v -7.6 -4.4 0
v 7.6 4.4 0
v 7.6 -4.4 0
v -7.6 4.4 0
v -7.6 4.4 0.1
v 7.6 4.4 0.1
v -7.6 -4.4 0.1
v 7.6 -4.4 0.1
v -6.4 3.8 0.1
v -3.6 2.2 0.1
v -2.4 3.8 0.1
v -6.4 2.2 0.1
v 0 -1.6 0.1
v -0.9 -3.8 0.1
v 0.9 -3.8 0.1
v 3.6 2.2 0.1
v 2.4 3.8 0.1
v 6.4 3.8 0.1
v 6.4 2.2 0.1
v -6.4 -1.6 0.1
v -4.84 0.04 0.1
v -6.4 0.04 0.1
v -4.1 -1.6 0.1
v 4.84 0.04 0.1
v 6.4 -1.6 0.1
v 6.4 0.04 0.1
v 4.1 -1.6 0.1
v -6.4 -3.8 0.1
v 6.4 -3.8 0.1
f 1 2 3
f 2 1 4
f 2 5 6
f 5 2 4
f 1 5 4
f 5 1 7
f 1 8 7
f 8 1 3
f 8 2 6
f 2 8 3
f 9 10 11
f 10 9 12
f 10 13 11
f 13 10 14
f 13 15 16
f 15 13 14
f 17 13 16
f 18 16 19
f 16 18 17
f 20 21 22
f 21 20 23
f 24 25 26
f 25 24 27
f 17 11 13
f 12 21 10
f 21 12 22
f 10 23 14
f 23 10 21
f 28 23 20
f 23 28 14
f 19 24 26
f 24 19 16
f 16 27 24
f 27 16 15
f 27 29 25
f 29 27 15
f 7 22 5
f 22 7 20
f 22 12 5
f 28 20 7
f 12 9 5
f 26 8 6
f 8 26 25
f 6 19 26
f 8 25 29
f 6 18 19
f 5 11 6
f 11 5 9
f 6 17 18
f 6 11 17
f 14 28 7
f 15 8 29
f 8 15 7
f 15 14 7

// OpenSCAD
// file: ../p/box5-12.scad
use <../lib.scad>
function ldraw_lib__box5_12() = [
// 0 Box with 5 Faces without Any Edges
// 0 Name: box5-12.dat
// 0 Author: Chris Dee [cwdee]
// 0 !LDRAW_ORG Primitive UPDATE 2009-02
// 0 !LICENSE Licensed under CC BY 4.0 : see CAreadme.txt
// 
// 0 BFC CERTIFY CCW
  [0,"BFC","CERTIFY"],
  [0,"BFC","CCW"],
// 
// 0 !HISTORY 2009-09-03 [PTadmin] Official Update 2009-02
// 
// 
// 4 16 1 1 1 1 1 -1 -1 1 -1 -1 1 1
  [4,16,1,1,1,1,1,-1,-1,1,-1,-1,1,1],
// 4 16 -1 0 1 1 0 1 1 1 1 -1 1 1
  [4,16,-1,0,1,1,0,1,1,1,1,-1,1,1],
// 4 16 -1 0 -1 -1 0 1 -1 1 1 -1 1 -1
  [4,16,-1,0,-1,-1,0,1,-1,1,1,-1,1,-1],
// 4 16 1 0 -1 -1 0 -1 -1 1 -1 1 1 -1
  [4,16,1,0,-1,-1,0,-1,-1,1,-1,1,1,-1],
// 4 16 1 0 1 1 0 -1 1 1 -1 1 1 1
  [4,16,1,0,1,1,0,-1,1,1,-1,1,1,1],
// 0
];
module ldraw_lib__box5_12(step=0, col=false, unit=2/5, alt=false, line=0.2, solid=!$preview)
    makepoly(ldraw_lib__box5_12(), step=step, col=col, unit=unit, alt=alt, line=line, solid=solid);
ldraw_lib__box5_12(line=0.2);
// main file
use <../lib.scad>
use <../p/box5-12.scad>
function ldraw_lib__165485a() = [
// 0 Sticker  1.1 x  1.9 with Blue V and Red Lines
// 0 Name: 165485a.dat
// 0 Author: David Manley [djm]
// 0 !LDRAW_ORG Part UPDATE 2019-01
// 0 !LICENSE Licensed under CC BY 4.0 : see CAreadme.txt
// 
// 0 BFC CERTIFY CCW
  [0,"BFC","CERTIFY"],
  [0,"BFC","CCW"],
// 
// 0 !KEYWORDS Airport, set 6346, shuttle
// 
// 0 !HISTORY 2019-06-28 [PTadmin] Official Update 2019-01
// 
// 
// 0 // Sticker backside.
// 1 16 0 -0.25 0 19 0 0 0 0.25 0 0 0 11 box5-12.dat
  [1,16,0,-0.25,0,19,0,0,0,0.25,0,0,0,11, ldraw_lib__box5_12()],
// 0 // Blue.
// 4 1 -16 -0.25 5.5 -9 -0.25 5.5 -6 -0.25 9.5 -16 -0.25 9.5
  [4,1,-16,-0.25,5.5,-9,-0.25,5.5,-6,-0.25,9.5,-16,-0.25,9.5],
// 4 1 -2.25 -0.25 -9.5 0 -0.25 -4 -6 -0.25 9.5 -9 -0.25 5.5
  [4,1,-2.25,-0.25,-9.5,0,-0.25,-4,-6,-0.25,9.5,-9,-0.25,5.5],
// 4 1 0 -0.25 -4 -2.25 -0.25 -9.5 2.25 -0.25 -9.5 9 -0.25 5.5
  [4,1,0,-0.25,-4,-2.25,-0.25,-9.5,2.25,-0.25,-9.5,9,-0.25,5.5],
// 3 1 6 -0.25 9.5 0 -0.25 -4 9 -0.25 5.5
  [3,1,6,-0.25,9.5,0,-0.25,-4,9,-0.25,5.5],
// 4 1 16 -0.25 9.5 6 -0.25 9.5 9 -0.25 5.5 16 -0.25 5.5
  [4,1,16,-0.25,9.5,6,-0.25,9.5,9,-0.25,5.5,16,-0.25,5.5],
// 0 // Red.
// 4 4 -16 -0.25 -4 -10.25 -0.25 -4 -12.1 -0.25 0.1 -16 -0.25 0.1
  [4,4,-16,-0.25,-4,-10.25,-0.25,-4,-12.1,-0.25,0.1,-16,-0.25,0.1],
// 4 4 16 -0.25 0.1 12.1 -0.25 0.1 10.25 -0.25 -4 16 -0.25 -4
  [4,4,16,-0.25,0.1,12.1,-0.25,0.1,10.25,-0.25,-4,16,-0.25,-4],
// 0 // Transparent Surface.
// 0 // V groove.
// 3 16 6 -0.25 9.5 -6 -0.25 9.5 0 -0.25 -4
  [3,16,6,-0.25,9.5,-6,-0.25,9.5,0,-0.25,-4],
// 0 // Left red stripe surround.
// 4 16 -16 -0.25 0.1 -12.1 -0.25 0.1 -9 -0.25 5.5 -16 -0.25 5.5
  [4,16,-16,-0.25,0.1,-12.1,-0.25,0.1,-9,-0.25,5.5,-16,-0.25,5.5],
// 4 16 -9 -0.25 5.5 -12.1 -0.25 0.1 -10.25 -0.25 -4 -2.25 -0.25 -9.5
  [4,16,-9,-0.25,5.5,-12.1,-0.25,0.1,-10.25,-0.25,-4,-2.25,-0.25,-9.5],
// 4 16 -16 -0.25 -9.5 -2.25 -0.25 -9.5 -10.25 -0.25 -4 -16 -0.25 -4
  [4,16,-16,-0.25,-9.5,-2.25,-0.25,-9.5,-10.25,-0.25,-4,-16,-0.25,-4],
// 0 // Right red stripe surround.
// 4 16 16 -0.25 5.5 9 -0.25 5.5 12.1 -0.25 0.1 16 -0.25 0.1
  [4,16,16,-0.25,5.5,9,-0.25,5.5,12.1,-0.25,0.1,16,-0.25,0.1],
// 4 16 2.25 -0.25 -9.5 10.25 -0.25 -4 12.1 -0.25 0.1 9 -0.25 5.5
  [4,16,2.25,-0.25,-9.5,10.25,-0.25,-4,12.1,-0.25,0.1,9,-0.25,5.5],
// 4 16 16 -0.25 -4 10.25 -0.25 -4 2.25 -0.25 -9.5 16 -0.25 -9.5
  [4,16,16,-0.25,-4,10.25,-0.25,-4,2.25,-0.25,-9.5,16,-0.25,-9.5],
// 0 // Left side.
// 4 16 -19 -0.25 -11 -16 -0.25 -4 -16 -0.25 0.1 -19 -0.25 11
  [4,16,-19,-0.25,-11,-16,-0.25,-4,-16,-0.25,0.1,-19,-0.25,11],
// 3 16 -16 -0.25 0.1 -16 -0.25 5.5 -19 -0.25 11
  [3,16,-16,-0.25,0.1,-16,-0.25,5.5,-19,-0.25,11],
// 3 16 -16 -0.25 -9.5 -16 -0.25 -4 -19 -0.25 -11
  [3,16,-16,-0.25,-9.5,-16,-0.25,-4,-19,-0.25,-11],
// 3 16 -16 -0.25 5.5 -16 -0.25 9.5 -19 -0.25 11
  [3,16,-16,-0.25,5.5,-16,-0.25,9.5,-19,-0.25,11],
// 0 // Right side.
// 4 16 19 -0.25 11 16 -0.25 0.1 16 -0.25 -4 19 -0.25 -11
  [4,16,19,-0.25,11,16,-0.25,0.1,16,-0.25,-4,19,-0.25,-11],
// 3 16 19 -0.25 11 16 -0.25 5.5 16 -0.25 0.1
  [3,16,19,-0.25,11,16,-0.25,5.5,16,-0.25,0.1],
// 3 16 19 -0.25 -11 16 -0.25 -4 16 -0.25 -9.5
  [3,16,19,-0.25,-11,16,-0.25,-4,16,-0.25,-9.5],
// 3 16 19 -0.25 11 16 -0.25 9.5 16 -0.25 5.5
  [3,16,19,-0.25,11,16,-0.25,9.5,16,-0.25,5.5],
// 0 // Top.
// 4 16 -19 -0.25 11 -16 -0.25 9.5 -6 -0.25 9.5 19 -0.25 11
  [4,16,-19,-0.25,11,-16,-0.25,9.5,-6,-0.25,9.5,19,-0.25,11],
// 3 16 19 -0.25 11 6 -0.25 9.5 16 -0.25 9.5
  [3,16,19,-0.25,11,6,-0.25,9.5,16,-0.25,9.5],
// 3 16 19 -0.25 11 -6 -0.25 9.5 6 -0.25 9.5
  [3,16,19,-0.25,11,-6,-0.25,9.5,6,-0.25,9.5],
// 0 // Bottom.
// 3 16 -2.25 -0.25 -9.5 -16 -0.25 -9.5 -19 -0.25 -11
  [3,16,-2.25,-0.25,-9.5,-16,-0.25,-9.5,-19,-0.25,-11],
// 4 16 19 -0.25 -11 16 -0.25 -9.5 2.25 -0.25 -9.5 -19 -0.25 -11
  [4,16,19,-0.25,-11,16,-0.25,-9.5,2.25,-0.25,-9.5,-19,-0.25,-11],
// 3 16 2.25 -0.25 -9.5 -2.25 -0.25 -9.5 -19 -0.25 -11
  [3,16,2.25,-0.25,-9.5,-2.25,-0.25,-9.5,-19,-0.25,-11],
];
module ldraw_lib__165485a(step=0, col=false, unit=2/5, alt=false, line=0.2, solid=!$preview)
    makepoly(ldraw_lib__165485a(), step=step, col=col, unit=unit, alt=alt, line=line, solid=solid);
ldraw_lib__165485a(line=0.2);
